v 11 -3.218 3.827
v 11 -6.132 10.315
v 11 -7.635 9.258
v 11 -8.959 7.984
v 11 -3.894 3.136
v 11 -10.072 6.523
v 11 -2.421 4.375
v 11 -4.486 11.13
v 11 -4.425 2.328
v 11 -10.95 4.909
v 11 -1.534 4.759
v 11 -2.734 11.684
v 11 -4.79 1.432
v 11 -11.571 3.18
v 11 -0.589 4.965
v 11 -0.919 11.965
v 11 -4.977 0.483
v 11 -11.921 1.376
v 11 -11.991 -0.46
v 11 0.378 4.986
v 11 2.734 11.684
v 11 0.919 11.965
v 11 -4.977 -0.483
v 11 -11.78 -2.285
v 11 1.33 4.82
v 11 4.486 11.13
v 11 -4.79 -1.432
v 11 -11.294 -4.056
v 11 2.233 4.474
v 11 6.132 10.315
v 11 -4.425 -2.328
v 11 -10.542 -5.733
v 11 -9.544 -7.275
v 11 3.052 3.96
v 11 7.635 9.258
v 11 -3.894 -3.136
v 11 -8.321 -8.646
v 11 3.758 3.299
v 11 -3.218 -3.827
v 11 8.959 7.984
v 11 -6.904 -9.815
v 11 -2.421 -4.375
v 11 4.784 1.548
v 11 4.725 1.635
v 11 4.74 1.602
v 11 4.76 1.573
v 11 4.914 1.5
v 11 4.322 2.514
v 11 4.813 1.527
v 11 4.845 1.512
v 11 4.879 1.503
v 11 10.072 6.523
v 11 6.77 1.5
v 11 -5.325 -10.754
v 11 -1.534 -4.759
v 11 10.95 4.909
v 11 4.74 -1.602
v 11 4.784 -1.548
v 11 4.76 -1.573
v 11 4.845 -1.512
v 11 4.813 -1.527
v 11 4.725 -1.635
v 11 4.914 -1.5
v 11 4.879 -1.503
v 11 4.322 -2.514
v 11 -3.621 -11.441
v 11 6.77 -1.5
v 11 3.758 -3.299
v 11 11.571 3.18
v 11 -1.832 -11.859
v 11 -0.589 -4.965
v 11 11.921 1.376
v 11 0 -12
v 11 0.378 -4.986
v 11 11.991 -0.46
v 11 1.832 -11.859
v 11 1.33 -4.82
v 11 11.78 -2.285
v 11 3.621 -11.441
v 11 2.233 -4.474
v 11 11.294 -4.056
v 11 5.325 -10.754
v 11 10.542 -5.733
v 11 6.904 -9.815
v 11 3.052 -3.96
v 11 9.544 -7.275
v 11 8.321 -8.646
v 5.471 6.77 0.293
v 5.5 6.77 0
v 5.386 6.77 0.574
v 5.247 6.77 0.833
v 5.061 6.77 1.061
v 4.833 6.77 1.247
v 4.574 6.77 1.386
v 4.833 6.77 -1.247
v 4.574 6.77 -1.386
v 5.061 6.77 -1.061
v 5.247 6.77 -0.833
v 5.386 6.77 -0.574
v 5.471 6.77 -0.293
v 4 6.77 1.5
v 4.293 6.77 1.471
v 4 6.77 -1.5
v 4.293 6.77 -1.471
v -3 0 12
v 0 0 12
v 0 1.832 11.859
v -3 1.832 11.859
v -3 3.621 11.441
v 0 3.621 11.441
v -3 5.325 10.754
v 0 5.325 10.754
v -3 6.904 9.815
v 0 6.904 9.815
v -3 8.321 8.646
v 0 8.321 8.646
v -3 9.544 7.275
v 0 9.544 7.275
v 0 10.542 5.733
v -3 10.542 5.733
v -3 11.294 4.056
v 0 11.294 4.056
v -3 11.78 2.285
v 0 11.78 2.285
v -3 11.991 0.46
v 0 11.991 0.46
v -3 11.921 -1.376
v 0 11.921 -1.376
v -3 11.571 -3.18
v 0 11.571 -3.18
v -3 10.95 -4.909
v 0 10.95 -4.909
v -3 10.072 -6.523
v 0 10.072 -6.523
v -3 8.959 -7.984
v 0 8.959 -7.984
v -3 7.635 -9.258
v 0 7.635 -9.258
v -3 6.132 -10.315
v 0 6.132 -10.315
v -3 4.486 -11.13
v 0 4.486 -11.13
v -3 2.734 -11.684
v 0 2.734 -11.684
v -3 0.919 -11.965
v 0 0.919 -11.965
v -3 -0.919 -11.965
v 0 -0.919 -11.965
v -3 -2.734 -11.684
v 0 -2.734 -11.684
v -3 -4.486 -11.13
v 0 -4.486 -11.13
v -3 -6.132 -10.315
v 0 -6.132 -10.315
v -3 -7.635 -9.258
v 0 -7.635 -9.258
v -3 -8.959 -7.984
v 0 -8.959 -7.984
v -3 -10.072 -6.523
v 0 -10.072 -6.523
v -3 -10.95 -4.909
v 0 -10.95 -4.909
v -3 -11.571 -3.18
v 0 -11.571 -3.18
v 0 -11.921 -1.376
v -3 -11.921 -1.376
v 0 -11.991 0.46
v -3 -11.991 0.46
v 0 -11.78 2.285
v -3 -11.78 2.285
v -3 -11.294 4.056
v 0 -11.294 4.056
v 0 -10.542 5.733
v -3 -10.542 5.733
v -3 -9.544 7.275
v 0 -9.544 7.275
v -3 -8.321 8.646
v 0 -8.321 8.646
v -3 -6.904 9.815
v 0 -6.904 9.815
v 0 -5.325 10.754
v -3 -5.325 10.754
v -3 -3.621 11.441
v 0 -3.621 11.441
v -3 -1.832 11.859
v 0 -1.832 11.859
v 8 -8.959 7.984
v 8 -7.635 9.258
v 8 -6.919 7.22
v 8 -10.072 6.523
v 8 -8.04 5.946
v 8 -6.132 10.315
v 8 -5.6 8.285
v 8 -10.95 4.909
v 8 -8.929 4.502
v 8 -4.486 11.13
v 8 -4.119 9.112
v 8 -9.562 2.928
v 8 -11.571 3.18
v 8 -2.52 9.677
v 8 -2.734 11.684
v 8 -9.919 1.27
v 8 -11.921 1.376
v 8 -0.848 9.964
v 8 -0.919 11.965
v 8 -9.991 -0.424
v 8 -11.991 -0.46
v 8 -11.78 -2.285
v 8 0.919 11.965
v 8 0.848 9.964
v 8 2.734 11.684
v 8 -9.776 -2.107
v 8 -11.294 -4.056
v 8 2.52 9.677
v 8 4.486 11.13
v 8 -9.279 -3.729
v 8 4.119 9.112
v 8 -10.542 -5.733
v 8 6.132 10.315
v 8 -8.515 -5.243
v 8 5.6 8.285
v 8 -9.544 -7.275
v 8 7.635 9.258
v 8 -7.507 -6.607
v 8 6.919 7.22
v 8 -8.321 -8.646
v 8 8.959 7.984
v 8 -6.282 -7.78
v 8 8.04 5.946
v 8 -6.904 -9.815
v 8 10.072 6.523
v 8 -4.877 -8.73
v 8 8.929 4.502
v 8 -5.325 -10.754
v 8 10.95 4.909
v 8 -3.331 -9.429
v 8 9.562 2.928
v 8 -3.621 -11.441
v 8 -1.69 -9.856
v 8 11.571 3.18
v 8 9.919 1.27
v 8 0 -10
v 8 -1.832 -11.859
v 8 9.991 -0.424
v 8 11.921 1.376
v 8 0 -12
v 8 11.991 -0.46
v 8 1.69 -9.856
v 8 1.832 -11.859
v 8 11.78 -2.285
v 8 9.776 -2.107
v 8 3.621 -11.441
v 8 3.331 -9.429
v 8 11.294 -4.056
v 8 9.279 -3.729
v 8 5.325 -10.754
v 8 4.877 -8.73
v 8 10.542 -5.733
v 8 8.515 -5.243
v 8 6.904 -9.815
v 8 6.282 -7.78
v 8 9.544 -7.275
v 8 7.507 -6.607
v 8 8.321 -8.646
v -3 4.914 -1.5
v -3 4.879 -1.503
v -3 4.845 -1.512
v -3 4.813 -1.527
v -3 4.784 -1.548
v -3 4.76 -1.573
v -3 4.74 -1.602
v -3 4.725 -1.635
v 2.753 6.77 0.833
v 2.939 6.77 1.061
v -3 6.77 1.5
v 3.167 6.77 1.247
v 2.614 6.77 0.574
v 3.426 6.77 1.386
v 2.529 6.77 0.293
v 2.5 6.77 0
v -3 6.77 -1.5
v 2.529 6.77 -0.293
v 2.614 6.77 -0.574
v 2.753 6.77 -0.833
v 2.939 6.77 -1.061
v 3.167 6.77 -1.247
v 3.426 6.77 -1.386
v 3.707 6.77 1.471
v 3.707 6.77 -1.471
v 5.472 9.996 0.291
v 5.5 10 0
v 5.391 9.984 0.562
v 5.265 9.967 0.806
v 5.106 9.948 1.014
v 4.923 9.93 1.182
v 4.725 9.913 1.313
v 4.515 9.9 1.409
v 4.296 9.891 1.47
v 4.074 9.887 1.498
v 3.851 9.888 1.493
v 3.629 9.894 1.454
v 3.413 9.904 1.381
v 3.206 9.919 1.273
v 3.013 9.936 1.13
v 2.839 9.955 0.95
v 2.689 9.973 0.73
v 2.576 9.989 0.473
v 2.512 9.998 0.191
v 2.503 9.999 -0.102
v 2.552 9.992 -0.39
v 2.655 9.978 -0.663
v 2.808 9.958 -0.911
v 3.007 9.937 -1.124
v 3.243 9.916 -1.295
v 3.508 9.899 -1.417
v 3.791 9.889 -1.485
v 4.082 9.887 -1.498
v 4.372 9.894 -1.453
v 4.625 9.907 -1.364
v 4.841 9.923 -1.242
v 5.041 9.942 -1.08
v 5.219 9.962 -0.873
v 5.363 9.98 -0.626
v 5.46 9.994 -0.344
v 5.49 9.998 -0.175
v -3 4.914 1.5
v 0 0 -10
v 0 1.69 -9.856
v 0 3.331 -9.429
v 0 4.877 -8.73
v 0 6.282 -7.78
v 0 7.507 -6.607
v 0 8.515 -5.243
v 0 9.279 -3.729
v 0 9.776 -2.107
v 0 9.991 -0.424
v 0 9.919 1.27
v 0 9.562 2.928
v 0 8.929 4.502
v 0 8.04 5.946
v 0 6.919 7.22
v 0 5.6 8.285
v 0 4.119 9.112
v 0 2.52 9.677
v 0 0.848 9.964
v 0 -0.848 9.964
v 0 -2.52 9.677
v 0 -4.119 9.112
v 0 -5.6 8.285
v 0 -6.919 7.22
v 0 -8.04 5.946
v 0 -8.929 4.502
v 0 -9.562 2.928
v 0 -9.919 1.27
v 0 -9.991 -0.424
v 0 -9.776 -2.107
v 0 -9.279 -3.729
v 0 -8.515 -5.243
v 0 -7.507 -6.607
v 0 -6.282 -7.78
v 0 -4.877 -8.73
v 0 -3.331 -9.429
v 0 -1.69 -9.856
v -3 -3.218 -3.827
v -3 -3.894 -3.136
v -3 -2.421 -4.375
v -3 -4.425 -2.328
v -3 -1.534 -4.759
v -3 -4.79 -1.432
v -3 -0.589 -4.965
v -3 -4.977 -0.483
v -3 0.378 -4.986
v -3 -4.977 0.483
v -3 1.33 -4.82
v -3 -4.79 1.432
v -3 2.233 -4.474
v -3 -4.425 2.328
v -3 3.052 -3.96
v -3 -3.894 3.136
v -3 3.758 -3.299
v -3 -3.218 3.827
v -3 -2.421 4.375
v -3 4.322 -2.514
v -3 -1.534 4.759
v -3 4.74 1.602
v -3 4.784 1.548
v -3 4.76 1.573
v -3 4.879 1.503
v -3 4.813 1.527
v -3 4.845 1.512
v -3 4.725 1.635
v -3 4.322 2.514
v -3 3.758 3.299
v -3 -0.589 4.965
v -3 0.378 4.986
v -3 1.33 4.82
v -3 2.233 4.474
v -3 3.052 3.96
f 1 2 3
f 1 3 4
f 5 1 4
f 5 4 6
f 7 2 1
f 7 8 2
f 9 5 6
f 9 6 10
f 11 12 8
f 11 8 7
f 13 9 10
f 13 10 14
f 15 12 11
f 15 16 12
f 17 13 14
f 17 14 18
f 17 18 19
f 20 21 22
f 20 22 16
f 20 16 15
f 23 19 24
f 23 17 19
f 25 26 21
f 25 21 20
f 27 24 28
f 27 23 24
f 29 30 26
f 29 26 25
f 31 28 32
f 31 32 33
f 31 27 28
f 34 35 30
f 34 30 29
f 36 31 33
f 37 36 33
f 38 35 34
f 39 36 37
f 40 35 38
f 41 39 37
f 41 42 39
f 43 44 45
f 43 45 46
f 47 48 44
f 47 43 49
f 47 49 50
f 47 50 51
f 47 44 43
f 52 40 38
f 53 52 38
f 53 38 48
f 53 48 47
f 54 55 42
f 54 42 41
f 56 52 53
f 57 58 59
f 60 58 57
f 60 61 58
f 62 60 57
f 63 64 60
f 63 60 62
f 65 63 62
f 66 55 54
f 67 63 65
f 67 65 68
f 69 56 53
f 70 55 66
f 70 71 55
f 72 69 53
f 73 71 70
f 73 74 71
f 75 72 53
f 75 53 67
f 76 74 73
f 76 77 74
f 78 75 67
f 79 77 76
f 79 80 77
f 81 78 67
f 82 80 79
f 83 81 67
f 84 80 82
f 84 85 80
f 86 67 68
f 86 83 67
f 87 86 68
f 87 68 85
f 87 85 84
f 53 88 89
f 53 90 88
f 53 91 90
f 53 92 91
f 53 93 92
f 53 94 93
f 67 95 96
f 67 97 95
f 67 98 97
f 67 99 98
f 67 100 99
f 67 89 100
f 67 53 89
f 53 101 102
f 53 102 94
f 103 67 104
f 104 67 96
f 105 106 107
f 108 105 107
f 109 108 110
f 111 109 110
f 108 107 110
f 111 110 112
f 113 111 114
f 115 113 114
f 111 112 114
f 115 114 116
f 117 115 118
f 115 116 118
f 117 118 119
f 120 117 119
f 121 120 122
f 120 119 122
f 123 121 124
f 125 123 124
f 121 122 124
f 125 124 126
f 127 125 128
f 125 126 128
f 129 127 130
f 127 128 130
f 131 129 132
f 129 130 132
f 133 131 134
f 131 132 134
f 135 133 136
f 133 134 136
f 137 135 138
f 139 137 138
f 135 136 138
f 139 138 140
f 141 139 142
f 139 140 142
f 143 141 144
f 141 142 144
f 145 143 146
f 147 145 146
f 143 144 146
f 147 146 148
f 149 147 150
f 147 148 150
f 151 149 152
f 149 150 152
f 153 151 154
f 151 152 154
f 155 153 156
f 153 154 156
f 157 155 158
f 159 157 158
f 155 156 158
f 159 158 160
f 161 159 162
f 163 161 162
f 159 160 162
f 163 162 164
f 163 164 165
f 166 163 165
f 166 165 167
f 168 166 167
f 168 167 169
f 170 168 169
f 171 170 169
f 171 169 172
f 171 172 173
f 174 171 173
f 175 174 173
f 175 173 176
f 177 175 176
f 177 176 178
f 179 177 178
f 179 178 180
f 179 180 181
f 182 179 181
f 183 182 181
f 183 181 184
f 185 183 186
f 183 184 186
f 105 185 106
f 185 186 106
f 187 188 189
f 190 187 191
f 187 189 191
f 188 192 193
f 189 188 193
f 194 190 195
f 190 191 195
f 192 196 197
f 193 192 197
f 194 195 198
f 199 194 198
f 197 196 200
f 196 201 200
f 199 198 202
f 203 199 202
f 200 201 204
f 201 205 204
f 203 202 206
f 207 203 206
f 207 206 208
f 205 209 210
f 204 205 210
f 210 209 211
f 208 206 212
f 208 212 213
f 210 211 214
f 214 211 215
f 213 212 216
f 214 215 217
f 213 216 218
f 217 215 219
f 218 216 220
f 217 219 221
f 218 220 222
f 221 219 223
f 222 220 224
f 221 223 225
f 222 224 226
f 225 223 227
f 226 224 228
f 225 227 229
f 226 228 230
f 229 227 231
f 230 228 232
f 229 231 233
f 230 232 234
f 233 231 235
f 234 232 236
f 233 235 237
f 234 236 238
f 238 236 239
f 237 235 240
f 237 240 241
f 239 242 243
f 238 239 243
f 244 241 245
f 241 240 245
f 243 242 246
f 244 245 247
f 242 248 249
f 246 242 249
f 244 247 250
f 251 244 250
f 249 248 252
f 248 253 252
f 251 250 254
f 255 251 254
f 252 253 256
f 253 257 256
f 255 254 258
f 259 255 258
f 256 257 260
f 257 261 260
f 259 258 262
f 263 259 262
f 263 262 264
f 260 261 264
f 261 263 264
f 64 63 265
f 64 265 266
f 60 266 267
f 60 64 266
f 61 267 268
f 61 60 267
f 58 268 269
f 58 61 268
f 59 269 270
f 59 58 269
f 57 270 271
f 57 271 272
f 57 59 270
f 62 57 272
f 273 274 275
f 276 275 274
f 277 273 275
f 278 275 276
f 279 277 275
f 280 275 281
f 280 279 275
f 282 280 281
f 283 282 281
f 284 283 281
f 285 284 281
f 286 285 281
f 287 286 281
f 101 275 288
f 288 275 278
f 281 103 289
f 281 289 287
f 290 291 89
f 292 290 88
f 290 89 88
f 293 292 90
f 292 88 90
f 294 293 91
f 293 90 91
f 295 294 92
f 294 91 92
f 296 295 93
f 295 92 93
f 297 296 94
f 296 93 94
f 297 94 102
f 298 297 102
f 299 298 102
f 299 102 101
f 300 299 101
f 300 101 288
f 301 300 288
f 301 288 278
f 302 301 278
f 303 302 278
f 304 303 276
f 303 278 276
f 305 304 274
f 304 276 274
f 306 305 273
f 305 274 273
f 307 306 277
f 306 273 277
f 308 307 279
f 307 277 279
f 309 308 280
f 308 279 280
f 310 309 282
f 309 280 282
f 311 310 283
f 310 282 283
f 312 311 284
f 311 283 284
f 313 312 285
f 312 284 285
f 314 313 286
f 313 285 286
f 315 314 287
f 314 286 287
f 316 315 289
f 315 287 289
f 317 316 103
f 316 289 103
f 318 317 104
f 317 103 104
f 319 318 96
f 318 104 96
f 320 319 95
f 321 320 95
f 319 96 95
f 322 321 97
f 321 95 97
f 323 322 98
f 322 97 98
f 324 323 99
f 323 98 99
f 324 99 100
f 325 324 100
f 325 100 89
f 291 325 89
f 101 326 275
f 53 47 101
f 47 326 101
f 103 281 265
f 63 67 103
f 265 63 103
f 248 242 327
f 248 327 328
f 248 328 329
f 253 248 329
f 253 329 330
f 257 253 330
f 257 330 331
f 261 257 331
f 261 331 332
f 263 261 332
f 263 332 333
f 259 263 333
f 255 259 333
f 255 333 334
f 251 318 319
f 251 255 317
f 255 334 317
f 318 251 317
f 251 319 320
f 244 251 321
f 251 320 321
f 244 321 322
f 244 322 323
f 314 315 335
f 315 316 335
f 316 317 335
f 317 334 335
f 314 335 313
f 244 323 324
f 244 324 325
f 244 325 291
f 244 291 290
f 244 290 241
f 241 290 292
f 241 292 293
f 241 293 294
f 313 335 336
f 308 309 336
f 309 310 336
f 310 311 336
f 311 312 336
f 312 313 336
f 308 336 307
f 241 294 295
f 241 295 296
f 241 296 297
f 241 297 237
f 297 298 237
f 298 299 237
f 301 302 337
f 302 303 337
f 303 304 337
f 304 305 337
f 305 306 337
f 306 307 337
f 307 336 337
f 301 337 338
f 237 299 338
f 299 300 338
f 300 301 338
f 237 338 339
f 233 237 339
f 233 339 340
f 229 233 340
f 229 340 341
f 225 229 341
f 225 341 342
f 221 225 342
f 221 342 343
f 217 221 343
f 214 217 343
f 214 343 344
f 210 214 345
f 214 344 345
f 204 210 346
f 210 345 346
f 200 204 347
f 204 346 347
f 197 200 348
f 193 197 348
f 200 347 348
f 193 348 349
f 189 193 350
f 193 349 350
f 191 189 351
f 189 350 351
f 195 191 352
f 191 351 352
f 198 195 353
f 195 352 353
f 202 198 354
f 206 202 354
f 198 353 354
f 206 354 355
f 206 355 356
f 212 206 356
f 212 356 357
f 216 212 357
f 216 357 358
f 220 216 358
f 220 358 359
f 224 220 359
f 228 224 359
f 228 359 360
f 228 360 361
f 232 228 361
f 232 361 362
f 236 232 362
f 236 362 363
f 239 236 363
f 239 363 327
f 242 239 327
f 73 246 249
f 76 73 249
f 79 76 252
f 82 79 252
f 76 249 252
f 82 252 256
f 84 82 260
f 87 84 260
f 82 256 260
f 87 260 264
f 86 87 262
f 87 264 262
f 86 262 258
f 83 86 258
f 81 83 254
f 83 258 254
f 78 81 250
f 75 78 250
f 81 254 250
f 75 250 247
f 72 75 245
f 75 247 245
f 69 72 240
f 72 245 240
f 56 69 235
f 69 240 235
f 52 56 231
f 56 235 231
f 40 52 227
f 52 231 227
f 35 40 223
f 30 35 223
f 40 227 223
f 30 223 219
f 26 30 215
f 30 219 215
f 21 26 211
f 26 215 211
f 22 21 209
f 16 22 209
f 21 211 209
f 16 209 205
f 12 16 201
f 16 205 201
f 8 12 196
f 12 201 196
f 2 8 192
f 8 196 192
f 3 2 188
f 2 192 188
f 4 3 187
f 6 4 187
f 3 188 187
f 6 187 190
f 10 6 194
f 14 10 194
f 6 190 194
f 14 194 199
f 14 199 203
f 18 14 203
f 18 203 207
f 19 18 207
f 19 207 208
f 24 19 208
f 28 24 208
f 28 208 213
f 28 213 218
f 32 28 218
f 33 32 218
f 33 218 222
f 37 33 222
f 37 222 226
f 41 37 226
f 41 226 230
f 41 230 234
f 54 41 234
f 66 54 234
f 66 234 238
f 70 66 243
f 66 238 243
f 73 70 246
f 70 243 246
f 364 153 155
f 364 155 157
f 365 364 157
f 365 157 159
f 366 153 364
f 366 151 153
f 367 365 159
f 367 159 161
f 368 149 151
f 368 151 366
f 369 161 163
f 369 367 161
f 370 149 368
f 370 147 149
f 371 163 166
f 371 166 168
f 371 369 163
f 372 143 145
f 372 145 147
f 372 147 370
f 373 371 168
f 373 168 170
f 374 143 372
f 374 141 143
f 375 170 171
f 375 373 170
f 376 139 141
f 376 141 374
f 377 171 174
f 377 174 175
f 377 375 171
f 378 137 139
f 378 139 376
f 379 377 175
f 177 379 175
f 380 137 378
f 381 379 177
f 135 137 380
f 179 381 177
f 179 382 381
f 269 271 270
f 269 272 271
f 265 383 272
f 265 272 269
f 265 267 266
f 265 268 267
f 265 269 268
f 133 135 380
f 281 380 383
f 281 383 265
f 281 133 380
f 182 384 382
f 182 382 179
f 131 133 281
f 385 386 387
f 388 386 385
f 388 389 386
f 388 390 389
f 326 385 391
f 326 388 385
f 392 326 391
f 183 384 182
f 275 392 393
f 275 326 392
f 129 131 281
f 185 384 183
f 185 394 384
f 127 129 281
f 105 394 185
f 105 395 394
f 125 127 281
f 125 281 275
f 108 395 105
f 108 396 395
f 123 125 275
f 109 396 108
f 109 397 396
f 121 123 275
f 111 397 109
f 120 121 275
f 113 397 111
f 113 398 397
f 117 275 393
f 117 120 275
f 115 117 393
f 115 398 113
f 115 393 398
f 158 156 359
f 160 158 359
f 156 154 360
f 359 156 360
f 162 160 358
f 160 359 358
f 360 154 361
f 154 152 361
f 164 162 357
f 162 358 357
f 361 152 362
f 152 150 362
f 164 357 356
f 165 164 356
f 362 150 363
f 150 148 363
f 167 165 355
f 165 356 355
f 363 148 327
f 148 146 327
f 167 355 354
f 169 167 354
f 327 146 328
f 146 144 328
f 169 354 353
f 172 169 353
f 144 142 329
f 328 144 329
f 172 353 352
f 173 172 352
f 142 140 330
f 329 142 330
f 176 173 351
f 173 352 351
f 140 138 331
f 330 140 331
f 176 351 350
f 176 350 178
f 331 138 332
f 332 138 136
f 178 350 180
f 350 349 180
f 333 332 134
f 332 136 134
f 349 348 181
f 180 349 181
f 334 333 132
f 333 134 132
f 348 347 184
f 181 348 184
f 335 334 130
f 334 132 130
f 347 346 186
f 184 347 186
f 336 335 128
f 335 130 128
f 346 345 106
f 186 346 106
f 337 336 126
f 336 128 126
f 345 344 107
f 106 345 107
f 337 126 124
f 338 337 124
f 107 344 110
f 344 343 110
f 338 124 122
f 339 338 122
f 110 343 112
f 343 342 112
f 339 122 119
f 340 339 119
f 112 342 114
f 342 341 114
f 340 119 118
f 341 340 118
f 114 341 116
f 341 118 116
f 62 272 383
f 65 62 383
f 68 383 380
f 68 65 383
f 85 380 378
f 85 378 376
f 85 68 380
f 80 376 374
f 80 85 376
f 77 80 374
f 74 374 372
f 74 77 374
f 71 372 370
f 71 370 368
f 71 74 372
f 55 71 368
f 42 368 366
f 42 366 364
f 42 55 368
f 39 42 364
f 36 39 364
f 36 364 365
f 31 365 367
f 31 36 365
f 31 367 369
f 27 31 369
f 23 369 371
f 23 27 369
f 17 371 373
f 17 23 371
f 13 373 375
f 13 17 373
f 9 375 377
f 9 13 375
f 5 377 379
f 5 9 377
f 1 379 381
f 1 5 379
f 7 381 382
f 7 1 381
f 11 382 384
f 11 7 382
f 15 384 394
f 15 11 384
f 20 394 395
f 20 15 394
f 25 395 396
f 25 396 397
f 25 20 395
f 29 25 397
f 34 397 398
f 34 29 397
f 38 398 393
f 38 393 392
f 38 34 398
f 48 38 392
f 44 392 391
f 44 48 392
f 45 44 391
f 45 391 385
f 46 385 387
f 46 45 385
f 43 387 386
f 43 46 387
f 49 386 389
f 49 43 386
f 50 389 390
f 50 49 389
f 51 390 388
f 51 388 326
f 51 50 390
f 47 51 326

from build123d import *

# Parameters (mm, degrees)
SKETCH1_R               = 10
BOSS_EXTRUDE1_DEPTH     = 8
SKETCH3_R               = 12
BOSS_EXTRUDE2_DEPTH     = 3
SKETCH4_R               = 12
BOSS_EXTRUDE3_DEPTH     = 3
CUT_EXTRUDE2_DEPTH      = 3
CUT_EXTRUDE2_DEPTH_BACK = 11
SKETCH6_R               = 1.5
CUT_EXTRUDE3_DEPTH      = 5


with BuildPart() as part:
    # Sketch1 → Boss-Extrude1 (new body)
    with BuildSketch(Plane(origin=(0, 0, 0), x_dir=(0, 0, -1), z_dir=(1, 0, 0))):
        Circle(SKETCH1_R)
    extrude(amount=BOSS_EXTRUDE1_DEPTH)

    # Sketch3 → Boss-Extrude2 (add)
    with BuildSketch(Plane(origin=(8, 0, 0), x_dir=(0, 0, -1), z_dir=(1, 0, 0))):
        Circle(SKETCH3_R)
    extrude(amount=BOSS_EXTRUDE2_DEPTH)

    # Sketch4 → Boss-Extrude3 (add)
    with BuildSketch(Plane.ZY):
        Circle(SKETCH4_R)
    extrude(amount=BOSS_EXTRUDE3_DEPTH)

    # Sketch2 → Cut-Extrude2 (cut, two sides)
    with BuildSketch(Plane(origin=(8, 0, 0), x_dir=(0, 0, -1), z_dir=(1, 0, 0))) as cut_extrude2_sk:
        with BuildLine():
            Line((-1.5, 6.769696007), (1.5, 6.769696007))
            Line((1.5, 6.769696007), (1.5, 4.91426495))
            ThreePointArc((1.5, 4.91426495), (1.537093703, 4.79824108), (1.634615385, 4.72525476))
            ThreePointArc((1.634615385, 4.72525476), (0, -5), (-1.634615385, 4.72525476))
            ThreePointArc((-1.634615385, 4.72525476), (-1.537093703, 4.79824108), (-1.5, 4.91426495))
            Line((-1.5, 4.91426495), (-1.5, 6.769696007))
        make_face()
    extrude(amount=CUT_EXTRUDE2_DEPTH, mode=Mode.SUBTRACT)
    extrude(cut_extrude2_sk.sketch, amount=-CUT_EXTRUDE2_DEPTH_BACK, mode=Mode.SUBTRACT)

    # Sketch6 → Cut-Extrude3 (cut)
    with BuildSketch(Plane.XZ.offset(-6.769696007)):
        with Locations((4, 0)):
            Circle(SKETCH6_R)
    extrude(amount=-CUT_EXTRUDE3_DEPTH, mode=Mode.SUBTRACT)


solid = part.part
